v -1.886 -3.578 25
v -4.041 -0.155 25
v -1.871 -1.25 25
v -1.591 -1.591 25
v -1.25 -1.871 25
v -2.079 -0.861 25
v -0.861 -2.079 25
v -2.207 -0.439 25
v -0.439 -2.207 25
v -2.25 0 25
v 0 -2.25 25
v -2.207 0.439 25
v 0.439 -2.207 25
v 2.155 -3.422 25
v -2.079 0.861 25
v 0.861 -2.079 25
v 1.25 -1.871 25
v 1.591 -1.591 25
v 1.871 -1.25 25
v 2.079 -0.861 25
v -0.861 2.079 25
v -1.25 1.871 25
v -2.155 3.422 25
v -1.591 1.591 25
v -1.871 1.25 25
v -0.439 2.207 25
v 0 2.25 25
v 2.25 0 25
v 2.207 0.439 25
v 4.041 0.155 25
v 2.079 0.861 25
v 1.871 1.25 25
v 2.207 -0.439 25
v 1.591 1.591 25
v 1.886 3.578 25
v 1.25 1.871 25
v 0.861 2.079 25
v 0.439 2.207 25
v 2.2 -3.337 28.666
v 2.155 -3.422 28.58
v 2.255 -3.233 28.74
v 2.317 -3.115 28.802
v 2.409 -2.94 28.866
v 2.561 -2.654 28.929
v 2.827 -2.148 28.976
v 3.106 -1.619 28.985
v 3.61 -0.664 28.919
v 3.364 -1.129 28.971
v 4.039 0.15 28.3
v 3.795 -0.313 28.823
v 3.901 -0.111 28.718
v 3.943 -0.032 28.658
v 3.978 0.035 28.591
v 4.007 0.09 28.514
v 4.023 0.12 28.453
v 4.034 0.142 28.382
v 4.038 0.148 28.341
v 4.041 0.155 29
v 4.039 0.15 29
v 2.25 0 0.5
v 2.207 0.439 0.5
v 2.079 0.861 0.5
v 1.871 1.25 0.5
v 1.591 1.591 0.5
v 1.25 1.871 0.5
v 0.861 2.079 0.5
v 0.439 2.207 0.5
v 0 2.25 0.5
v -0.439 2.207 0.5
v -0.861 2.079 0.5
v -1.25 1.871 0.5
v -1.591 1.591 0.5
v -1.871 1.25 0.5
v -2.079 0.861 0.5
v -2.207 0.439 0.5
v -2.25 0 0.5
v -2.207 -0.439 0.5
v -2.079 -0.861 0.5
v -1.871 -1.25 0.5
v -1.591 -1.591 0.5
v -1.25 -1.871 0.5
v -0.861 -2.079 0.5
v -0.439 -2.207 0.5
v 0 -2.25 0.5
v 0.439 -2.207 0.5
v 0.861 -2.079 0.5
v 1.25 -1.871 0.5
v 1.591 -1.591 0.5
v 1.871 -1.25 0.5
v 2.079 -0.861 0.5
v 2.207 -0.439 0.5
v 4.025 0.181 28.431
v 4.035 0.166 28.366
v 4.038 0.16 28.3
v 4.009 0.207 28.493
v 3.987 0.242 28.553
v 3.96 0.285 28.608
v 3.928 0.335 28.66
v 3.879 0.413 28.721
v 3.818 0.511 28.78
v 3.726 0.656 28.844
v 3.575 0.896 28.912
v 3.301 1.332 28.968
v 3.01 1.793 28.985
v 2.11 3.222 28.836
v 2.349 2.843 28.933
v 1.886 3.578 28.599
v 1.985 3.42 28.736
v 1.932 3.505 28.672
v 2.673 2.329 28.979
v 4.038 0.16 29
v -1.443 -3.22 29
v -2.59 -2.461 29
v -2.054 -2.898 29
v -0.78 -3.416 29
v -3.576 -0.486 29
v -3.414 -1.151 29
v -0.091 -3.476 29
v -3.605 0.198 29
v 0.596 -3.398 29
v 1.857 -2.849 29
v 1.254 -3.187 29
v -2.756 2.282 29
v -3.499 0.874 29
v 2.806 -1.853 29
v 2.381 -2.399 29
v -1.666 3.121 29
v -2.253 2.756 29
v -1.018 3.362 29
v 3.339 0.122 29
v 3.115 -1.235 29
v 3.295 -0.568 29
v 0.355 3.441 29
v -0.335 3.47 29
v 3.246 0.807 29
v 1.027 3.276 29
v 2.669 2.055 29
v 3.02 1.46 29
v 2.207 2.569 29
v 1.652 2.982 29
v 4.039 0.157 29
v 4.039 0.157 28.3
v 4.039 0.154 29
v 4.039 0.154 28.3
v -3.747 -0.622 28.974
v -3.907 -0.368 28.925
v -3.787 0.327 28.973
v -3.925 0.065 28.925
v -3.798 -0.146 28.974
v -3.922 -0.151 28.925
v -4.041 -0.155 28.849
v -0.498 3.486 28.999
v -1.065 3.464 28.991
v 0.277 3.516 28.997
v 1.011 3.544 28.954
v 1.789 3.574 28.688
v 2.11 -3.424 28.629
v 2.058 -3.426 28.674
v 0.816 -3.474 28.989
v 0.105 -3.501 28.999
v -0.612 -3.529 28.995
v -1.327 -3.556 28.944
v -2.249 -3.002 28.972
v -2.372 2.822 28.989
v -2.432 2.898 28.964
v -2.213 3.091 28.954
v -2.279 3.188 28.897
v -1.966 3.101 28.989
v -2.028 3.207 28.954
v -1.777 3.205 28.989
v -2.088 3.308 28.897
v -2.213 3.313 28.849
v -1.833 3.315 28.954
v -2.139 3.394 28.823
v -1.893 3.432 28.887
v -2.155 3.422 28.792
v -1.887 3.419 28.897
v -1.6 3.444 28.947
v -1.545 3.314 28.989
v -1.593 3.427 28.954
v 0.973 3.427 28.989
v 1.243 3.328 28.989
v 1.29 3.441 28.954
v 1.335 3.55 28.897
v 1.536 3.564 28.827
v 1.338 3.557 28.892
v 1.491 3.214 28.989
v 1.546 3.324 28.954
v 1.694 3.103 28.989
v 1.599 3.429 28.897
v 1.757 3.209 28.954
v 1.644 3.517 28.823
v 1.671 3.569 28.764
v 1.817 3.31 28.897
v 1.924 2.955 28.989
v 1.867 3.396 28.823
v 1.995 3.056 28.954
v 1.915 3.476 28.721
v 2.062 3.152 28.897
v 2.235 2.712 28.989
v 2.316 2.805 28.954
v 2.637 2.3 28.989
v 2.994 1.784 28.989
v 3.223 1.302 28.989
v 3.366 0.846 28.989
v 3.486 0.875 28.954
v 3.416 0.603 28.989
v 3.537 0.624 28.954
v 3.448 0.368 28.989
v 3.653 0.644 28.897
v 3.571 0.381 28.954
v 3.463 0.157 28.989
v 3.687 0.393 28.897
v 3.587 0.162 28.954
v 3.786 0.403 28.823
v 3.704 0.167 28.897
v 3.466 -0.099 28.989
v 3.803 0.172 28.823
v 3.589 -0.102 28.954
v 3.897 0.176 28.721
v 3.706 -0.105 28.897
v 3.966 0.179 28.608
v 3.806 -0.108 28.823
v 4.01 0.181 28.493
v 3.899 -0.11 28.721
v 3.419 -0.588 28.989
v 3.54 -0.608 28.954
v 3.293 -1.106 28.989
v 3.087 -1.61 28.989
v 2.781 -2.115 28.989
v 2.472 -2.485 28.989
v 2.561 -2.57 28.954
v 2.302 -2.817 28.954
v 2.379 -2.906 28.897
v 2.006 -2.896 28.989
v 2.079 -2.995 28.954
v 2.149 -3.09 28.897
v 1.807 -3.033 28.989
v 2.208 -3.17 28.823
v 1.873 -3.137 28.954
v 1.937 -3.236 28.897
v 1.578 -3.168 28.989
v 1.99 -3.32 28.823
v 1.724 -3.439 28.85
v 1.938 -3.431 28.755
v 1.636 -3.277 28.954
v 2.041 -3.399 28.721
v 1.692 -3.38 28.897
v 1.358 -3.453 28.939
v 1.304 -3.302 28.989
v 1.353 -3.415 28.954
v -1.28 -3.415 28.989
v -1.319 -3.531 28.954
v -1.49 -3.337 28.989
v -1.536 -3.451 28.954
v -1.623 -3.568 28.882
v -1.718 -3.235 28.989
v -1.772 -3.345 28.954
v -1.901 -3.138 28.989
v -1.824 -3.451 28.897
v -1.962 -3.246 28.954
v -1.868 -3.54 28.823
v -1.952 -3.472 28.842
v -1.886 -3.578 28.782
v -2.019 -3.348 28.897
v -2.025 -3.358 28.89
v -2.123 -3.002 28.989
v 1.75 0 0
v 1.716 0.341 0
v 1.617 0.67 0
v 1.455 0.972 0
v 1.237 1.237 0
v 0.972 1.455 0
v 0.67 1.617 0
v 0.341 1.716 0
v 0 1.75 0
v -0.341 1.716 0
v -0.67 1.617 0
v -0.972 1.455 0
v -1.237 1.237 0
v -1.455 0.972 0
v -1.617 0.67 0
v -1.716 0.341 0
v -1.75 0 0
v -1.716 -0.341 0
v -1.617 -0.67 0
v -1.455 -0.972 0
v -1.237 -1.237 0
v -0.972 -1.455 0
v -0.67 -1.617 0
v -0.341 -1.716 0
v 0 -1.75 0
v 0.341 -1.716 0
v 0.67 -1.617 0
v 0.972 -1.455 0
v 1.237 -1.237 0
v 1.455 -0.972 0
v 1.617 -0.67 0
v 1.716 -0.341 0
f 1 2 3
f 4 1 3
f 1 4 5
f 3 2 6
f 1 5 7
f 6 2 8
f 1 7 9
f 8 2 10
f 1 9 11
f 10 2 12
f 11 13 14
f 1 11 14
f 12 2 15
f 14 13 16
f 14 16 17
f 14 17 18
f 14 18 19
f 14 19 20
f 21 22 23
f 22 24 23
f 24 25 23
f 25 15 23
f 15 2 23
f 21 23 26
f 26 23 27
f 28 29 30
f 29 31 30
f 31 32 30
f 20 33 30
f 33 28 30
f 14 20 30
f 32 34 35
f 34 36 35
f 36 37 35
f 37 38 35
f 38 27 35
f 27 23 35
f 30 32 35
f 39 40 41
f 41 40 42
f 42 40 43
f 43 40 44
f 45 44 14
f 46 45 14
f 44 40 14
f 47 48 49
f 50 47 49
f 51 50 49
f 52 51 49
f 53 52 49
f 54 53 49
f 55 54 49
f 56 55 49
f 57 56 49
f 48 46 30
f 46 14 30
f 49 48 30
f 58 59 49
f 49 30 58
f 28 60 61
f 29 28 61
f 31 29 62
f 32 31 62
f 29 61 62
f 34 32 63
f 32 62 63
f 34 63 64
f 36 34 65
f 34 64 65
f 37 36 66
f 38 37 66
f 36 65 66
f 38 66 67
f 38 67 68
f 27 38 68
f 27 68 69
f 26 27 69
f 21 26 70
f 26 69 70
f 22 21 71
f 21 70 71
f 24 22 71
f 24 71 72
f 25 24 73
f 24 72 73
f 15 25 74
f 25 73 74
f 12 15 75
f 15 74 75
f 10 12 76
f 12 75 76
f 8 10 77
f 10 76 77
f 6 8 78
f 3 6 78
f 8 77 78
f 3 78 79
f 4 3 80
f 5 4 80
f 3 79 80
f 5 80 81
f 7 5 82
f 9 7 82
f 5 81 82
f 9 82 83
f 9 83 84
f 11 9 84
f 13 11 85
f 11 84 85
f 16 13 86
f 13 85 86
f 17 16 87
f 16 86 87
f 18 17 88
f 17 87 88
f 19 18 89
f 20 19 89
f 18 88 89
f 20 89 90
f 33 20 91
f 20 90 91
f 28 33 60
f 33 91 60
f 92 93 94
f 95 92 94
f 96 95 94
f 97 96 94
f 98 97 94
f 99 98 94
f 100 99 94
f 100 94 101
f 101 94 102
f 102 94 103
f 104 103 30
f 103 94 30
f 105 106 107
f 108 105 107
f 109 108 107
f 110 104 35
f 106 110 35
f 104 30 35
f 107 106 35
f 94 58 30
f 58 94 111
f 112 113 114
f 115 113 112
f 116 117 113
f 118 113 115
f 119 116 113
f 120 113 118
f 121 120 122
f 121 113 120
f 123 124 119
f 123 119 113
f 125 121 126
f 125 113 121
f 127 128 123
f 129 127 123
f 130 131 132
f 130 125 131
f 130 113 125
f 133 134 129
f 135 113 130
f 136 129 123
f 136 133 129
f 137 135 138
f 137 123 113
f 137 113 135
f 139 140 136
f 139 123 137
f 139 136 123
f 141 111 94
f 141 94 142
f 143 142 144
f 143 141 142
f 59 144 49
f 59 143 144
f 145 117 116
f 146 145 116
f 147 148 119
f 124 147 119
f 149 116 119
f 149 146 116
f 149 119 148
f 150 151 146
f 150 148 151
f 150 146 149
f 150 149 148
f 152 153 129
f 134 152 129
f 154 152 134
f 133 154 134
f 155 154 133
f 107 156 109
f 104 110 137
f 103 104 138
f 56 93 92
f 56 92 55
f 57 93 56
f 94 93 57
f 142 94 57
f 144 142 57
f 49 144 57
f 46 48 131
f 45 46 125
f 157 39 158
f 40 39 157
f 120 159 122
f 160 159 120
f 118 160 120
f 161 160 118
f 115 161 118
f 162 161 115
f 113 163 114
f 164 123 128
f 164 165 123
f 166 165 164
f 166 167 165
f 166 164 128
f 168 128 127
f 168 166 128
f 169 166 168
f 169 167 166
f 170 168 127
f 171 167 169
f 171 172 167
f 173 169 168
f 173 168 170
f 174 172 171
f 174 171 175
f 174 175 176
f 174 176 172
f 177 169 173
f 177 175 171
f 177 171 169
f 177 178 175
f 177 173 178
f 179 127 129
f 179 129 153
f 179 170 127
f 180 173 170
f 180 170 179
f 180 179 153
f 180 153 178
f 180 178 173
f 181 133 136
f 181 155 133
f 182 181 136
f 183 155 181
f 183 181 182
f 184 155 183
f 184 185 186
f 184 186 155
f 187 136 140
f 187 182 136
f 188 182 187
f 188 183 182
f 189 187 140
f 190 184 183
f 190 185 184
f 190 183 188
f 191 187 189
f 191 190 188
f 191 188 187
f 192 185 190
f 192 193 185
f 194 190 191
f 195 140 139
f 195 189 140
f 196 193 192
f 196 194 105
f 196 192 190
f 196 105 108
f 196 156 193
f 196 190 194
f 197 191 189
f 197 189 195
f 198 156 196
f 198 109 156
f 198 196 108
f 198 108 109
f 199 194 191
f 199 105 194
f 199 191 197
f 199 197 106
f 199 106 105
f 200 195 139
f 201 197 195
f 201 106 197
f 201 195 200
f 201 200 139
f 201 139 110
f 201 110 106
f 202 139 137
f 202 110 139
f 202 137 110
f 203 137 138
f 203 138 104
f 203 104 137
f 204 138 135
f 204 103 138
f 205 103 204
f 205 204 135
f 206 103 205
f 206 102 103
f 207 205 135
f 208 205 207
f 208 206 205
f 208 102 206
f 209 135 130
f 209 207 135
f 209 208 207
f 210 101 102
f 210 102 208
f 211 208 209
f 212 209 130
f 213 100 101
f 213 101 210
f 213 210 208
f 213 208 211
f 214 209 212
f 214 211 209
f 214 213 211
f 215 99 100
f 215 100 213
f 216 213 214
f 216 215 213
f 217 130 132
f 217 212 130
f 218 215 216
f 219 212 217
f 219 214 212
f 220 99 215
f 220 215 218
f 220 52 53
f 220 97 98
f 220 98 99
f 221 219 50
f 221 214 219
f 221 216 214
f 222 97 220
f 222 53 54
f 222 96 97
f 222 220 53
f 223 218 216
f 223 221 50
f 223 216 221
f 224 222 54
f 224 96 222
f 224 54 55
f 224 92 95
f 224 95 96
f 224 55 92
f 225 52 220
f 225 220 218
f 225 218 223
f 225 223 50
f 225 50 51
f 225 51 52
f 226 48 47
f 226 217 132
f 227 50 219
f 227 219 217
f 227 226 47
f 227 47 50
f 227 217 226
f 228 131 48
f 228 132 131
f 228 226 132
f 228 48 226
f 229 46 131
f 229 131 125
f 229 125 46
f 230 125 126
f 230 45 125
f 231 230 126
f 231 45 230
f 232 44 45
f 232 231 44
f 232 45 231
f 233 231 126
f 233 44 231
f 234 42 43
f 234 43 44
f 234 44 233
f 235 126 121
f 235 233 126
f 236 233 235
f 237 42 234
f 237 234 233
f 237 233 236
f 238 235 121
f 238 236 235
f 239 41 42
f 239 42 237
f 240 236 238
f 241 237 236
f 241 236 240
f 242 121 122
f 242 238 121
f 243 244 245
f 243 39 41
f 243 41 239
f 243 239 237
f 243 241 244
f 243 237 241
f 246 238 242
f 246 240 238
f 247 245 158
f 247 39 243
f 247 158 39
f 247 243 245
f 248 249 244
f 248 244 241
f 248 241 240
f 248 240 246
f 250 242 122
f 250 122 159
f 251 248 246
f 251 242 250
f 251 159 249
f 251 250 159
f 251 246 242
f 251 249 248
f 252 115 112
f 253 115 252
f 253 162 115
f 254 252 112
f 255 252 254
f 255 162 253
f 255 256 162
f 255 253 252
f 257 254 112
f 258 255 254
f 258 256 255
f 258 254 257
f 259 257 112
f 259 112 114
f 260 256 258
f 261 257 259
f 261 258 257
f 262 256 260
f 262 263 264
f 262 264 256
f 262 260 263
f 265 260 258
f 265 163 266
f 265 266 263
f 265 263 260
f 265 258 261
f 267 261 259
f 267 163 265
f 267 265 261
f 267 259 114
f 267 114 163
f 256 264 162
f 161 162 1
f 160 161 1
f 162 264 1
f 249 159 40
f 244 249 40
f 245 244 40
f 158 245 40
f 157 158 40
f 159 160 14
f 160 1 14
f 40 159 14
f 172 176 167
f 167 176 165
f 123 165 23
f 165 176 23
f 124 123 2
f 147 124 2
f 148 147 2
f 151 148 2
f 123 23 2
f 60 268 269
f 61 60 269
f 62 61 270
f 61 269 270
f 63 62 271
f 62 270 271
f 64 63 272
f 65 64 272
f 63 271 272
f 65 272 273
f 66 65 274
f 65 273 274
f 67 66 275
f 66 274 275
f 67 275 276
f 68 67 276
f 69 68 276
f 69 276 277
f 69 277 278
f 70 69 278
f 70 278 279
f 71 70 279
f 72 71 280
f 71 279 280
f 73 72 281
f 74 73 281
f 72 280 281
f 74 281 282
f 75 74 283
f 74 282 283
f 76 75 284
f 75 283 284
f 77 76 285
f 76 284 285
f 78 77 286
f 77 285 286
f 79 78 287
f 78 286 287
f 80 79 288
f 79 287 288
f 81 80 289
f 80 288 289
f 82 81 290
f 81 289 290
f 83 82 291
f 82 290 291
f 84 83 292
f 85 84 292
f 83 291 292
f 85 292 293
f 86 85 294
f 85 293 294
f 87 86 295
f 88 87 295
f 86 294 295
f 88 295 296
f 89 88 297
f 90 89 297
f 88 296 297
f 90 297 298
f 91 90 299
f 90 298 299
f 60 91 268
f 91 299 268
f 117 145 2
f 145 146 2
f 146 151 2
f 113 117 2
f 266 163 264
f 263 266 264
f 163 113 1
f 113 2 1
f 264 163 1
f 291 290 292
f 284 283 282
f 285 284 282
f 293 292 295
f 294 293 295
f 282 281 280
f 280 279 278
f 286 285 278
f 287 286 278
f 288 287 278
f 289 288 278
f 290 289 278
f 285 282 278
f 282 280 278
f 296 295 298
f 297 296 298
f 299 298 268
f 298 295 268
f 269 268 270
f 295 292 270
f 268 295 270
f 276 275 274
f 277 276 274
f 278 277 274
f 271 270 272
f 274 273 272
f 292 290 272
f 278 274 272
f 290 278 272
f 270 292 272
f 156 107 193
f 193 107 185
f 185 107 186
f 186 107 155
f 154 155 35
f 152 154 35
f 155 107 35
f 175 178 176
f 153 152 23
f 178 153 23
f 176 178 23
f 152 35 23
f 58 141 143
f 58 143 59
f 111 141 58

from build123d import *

# Parameters (mm, degrees)
SKETCH1_R           = 2.25
BOSS_EXTRUDE1_DEPTH = 25
BOSS_EXTRUDE2_DEPTH = 4
CHAMFER1_SIZE       = 0.5


with BuildPart() as part:
    # Sketch1 → Boss-Extrude1 (new body)
    with BuildSketch(Plane.XY):
        Circle(SKETCH1_R)
    extrude(amount=BOSS_EXTRUDE1_DEPTH)

    # Sketch2 → Boss-Extrude2 (add)
    with BuildSketch(Plane.XY.offset(25)):
        Polygon((1.886184201, 3.57767771), (-2.155267683, 3.42232229), (-4.041451884, -0.15535542), (-1.886184201, -3.57767771), (2.155267683, -3.42232229), (4.041451884, 0.15535542), align=None)
    extrude(amount=BOSS_EXTRUDE2_DEPTH)

    # Sketch4 → Cut-Revolve1 (revolve, cut)
    with BuildSketch(Plane(origin=(0, 0, 0), x_dir=(1, 0, 0), z_dir=(0, 1, 0))):
        with BuildLine():
            Line((4.041451884, -28.3), (4.041451884, -29))
            Line((4.041451884, -29), (3.341451884, -29))
            ThreePointArc((3.341451884, -29), (3.836426631, -28.794974747), (4.041451884, -28.3))
        make_face()
    revolve(axis=Axis((-0.134541741, 0, 29), (0, 0, -1)), mode=Mode.SUBTRACT)

    # Chamfer1
    chamfer1_edges = [part.edges().sort_by_distance(p)[0] for p in [
        (-2.25, 0, 0),
    ]]
    chamfer(chamfer1_edges, length=CHAMFER1_SIZE)


solid = part.part
